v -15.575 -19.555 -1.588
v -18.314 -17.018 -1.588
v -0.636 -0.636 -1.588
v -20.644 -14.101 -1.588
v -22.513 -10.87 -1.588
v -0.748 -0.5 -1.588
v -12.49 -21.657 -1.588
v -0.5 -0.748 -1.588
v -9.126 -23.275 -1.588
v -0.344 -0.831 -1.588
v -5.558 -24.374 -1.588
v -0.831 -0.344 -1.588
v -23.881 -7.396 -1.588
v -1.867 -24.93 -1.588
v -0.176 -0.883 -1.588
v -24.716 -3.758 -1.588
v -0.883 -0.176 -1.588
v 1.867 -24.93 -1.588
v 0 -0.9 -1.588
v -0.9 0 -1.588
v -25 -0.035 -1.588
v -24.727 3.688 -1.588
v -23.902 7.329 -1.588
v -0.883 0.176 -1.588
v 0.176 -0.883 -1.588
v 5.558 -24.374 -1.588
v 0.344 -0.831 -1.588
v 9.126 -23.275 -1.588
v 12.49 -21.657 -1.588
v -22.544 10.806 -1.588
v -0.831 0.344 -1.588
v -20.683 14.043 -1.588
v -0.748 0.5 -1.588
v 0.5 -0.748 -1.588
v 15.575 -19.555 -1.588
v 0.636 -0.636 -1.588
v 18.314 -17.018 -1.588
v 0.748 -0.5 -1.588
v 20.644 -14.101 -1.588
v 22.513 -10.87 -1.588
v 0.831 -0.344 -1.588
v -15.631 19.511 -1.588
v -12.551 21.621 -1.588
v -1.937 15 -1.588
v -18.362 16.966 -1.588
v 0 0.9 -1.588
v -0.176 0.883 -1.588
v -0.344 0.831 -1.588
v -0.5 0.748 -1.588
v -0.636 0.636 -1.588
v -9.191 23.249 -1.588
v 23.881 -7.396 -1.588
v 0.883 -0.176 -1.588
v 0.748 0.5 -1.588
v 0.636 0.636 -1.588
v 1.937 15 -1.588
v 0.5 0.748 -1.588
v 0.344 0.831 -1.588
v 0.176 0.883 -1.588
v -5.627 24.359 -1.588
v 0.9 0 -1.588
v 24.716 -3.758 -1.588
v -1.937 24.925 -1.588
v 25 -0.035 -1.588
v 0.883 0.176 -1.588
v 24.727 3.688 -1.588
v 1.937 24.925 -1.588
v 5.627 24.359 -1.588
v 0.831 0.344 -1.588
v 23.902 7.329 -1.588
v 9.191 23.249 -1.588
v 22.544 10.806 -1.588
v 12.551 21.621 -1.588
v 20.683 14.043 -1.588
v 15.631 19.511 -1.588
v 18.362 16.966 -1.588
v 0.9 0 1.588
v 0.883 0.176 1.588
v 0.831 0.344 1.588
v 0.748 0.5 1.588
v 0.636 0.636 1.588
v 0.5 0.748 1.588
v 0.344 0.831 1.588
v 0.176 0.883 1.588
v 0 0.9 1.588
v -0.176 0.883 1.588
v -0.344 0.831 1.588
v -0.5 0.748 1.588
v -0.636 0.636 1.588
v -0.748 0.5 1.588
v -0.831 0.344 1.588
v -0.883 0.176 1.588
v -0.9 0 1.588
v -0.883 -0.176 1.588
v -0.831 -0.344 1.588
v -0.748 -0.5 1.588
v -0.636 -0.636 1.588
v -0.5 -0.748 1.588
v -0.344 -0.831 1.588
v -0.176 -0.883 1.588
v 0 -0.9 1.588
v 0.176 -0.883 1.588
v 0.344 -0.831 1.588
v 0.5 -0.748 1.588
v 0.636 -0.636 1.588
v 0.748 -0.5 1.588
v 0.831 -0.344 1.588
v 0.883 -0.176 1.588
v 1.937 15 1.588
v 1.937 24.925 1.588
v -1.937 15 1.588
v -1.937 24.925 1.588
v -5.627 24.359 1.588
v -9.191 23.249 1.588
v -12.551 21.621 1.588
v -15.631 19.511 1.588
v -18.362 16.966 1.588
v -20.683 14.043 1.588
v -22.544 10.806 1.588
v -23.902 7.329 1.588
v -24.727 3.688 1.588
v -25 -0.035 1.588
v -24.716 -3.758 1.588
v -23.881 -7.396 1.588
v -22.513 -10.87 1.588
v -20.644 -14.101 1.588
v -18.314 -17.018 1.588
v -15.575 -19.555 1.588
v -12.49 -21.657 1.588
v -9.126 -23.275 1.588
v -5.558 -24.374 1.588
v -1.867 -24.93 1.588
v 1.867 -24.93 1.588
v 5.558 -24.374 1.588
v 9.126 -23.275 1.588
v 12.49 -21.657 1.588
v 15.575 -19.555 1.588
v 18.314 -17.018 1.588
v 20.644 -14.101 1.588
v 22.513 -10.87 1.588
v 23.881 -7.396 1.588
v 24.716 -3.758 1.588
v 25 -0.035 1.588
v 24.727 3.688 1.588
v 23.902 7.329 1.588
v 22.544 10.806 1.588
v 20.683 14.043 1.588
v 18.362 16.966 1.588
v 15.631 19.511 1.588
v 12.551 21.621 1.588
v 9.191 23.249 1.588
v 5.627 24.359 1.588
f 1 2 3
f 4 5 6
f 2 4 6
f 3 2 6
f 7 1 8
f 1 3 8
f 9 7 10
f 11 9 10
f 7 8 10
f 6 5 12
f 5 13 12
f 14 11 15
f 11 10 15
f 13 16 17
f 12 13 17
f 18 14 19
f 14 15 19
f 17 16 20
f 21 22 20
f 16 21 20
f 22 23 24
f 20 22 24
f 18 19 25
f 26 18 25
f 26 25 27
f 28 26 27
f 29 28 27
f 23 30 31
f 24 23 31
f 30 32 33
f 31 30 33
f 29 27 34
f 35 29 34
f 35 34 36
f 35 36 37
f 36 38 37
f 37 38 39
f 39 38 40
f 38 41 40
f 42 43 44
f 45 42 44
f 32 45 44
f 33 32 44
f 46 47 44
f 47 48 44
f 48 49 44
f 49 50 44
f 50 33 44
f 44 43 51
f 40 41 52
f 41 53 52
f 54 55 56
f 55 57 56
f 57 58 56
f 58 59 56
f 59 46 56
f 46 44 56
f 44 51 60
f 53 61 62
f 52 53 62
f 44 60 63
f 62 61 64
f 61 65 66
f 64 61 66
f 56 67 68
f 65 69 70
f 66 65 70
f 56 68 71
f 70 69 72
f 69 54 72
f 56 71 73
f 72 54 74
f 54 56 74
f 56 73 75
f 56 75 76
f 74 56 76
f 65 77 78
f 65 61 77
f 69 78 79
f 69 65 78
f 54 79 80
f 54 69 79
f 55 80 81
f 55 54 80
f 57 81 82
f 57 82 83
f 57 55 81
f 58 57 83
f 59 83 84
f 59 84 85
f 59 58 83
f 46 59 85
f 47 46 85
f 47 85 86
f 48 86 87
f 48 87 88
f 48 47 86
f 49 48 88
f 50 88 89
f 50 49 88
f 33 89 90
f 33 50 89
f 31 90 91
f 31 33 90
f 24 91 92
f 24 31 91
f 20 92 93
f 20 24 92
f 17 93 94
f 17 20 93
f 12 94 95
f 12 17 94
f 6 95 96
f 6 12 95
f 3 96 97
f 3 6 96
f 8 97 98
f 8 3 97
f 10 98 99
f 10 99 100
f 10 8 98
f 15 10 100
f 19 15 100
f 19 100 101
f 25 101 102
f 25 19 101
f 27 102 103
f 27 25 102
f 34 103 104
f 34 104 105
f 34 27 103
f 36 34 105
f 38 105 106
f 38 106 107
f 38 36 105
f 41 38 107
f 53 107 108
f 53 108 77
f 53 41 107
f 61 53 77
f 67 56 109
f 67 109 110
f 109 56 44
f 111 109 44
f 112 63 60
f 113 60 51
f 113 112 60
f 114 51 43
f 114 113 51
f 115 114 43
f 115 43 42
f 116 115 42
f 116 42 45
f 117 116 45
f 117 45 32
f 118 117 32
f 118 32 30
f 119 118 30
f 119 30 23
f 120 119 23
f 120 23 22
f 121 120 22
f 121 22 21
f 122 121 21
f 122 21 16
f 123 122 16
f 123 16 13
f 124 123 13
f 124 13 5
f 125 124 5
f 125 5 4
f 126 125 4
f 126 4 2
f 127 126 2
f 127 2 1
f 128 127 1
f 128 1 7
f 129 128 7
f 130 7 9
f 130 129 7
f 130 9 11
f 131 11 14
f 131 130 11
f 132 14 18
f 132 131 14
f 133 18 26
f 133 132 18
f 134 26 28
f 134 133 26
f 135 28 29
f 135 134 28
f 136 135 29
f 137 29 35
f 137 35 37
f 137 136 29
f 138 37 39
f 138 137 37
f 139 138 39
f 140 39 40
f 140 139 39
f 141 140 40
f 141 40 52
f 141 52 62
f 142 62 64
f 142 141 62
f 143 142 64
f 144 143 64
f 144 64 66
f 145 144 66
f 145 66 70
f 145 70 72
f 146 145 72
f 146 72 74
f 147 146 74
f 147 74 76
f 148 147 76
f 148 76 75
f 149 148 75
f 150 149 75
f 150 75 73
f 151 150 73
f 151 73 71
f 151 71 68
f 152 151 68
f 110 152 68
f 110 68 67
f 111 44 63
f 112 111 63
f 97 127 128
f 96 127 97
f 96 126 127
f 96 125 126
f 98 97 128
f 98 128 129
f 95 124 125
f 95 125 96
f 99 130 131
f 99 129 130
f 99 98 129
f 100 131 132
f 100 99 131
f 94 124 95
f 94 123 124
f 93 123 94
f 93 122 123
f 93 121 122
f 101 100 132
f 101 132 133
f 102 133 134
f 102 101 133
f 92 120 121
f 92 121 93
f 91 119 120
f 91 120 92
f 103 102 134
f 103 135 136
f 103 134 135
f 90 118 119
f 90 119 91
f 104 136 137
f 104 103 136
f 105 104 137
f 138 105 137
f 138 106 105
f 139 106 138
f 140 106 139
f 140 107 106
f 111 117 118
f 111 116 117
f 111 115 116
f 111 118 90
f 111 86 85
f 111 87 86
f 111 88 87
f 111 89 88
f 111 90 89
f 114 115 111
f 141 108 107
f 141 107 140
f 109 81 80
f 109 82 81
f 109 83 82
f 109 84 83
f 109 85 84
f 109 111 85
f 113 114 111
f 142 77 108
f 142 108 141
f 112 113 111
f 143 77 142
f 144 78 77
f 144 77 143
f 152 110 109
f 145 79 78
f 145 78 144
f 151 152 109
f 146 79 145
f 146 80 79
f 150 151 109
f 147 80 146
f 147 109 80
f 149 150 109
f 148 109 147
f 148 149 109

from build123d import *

# Parameters (mm, degrees)
SKETCH1_R           = 25
SKETCH1_R_2         = 0.9
BOSS_EXTRUDE1_DEPTH = 1.5875
CUT_EXTRUDE1_REACH  = 37.498
SKETCH2_W           = 3.873993702
SKETCH2_H           = 19.044786736


with BuildPart() as part:
    # Sketch1 → Boss-Extrude1 (new, symmetric)
    with BuildSketch(Plane.XY):
        Circle(SKETCH1_R)
        Circle(SKETCH1_R_2, mode=Mode.SUBTRACT)
    extrude(amount=BOSS_EXTRUDE1_DEPTH, both=True)

    # Sketch2 → Cut-Extrude1 (cut, up to next)
    with BuildSketch(Plane(origin=(0, 0, -1.5875), x_dir=(-1, 0, 0), z_dir=(0, 0, -1)), mode=Mode.PRIVATE) as cut_extrude1_sk1:
        with Locations((0, 24.522393368)):
            Rectangle(SKETCH2_W, SKETCH2_H)
    cut_extrude1_tool1 = extrude(cut_extrude1_sk1.sketch, amount=-CUT_EXTRUDE1_REACH, mode=Mode.PRIVATE) & part.part
    add(cut_extrude1_tool1.solids().sort_by_distance((0, 24.522393, -1.5875))[0], mode=Mode.SUBTRACT)


solid = part.part
